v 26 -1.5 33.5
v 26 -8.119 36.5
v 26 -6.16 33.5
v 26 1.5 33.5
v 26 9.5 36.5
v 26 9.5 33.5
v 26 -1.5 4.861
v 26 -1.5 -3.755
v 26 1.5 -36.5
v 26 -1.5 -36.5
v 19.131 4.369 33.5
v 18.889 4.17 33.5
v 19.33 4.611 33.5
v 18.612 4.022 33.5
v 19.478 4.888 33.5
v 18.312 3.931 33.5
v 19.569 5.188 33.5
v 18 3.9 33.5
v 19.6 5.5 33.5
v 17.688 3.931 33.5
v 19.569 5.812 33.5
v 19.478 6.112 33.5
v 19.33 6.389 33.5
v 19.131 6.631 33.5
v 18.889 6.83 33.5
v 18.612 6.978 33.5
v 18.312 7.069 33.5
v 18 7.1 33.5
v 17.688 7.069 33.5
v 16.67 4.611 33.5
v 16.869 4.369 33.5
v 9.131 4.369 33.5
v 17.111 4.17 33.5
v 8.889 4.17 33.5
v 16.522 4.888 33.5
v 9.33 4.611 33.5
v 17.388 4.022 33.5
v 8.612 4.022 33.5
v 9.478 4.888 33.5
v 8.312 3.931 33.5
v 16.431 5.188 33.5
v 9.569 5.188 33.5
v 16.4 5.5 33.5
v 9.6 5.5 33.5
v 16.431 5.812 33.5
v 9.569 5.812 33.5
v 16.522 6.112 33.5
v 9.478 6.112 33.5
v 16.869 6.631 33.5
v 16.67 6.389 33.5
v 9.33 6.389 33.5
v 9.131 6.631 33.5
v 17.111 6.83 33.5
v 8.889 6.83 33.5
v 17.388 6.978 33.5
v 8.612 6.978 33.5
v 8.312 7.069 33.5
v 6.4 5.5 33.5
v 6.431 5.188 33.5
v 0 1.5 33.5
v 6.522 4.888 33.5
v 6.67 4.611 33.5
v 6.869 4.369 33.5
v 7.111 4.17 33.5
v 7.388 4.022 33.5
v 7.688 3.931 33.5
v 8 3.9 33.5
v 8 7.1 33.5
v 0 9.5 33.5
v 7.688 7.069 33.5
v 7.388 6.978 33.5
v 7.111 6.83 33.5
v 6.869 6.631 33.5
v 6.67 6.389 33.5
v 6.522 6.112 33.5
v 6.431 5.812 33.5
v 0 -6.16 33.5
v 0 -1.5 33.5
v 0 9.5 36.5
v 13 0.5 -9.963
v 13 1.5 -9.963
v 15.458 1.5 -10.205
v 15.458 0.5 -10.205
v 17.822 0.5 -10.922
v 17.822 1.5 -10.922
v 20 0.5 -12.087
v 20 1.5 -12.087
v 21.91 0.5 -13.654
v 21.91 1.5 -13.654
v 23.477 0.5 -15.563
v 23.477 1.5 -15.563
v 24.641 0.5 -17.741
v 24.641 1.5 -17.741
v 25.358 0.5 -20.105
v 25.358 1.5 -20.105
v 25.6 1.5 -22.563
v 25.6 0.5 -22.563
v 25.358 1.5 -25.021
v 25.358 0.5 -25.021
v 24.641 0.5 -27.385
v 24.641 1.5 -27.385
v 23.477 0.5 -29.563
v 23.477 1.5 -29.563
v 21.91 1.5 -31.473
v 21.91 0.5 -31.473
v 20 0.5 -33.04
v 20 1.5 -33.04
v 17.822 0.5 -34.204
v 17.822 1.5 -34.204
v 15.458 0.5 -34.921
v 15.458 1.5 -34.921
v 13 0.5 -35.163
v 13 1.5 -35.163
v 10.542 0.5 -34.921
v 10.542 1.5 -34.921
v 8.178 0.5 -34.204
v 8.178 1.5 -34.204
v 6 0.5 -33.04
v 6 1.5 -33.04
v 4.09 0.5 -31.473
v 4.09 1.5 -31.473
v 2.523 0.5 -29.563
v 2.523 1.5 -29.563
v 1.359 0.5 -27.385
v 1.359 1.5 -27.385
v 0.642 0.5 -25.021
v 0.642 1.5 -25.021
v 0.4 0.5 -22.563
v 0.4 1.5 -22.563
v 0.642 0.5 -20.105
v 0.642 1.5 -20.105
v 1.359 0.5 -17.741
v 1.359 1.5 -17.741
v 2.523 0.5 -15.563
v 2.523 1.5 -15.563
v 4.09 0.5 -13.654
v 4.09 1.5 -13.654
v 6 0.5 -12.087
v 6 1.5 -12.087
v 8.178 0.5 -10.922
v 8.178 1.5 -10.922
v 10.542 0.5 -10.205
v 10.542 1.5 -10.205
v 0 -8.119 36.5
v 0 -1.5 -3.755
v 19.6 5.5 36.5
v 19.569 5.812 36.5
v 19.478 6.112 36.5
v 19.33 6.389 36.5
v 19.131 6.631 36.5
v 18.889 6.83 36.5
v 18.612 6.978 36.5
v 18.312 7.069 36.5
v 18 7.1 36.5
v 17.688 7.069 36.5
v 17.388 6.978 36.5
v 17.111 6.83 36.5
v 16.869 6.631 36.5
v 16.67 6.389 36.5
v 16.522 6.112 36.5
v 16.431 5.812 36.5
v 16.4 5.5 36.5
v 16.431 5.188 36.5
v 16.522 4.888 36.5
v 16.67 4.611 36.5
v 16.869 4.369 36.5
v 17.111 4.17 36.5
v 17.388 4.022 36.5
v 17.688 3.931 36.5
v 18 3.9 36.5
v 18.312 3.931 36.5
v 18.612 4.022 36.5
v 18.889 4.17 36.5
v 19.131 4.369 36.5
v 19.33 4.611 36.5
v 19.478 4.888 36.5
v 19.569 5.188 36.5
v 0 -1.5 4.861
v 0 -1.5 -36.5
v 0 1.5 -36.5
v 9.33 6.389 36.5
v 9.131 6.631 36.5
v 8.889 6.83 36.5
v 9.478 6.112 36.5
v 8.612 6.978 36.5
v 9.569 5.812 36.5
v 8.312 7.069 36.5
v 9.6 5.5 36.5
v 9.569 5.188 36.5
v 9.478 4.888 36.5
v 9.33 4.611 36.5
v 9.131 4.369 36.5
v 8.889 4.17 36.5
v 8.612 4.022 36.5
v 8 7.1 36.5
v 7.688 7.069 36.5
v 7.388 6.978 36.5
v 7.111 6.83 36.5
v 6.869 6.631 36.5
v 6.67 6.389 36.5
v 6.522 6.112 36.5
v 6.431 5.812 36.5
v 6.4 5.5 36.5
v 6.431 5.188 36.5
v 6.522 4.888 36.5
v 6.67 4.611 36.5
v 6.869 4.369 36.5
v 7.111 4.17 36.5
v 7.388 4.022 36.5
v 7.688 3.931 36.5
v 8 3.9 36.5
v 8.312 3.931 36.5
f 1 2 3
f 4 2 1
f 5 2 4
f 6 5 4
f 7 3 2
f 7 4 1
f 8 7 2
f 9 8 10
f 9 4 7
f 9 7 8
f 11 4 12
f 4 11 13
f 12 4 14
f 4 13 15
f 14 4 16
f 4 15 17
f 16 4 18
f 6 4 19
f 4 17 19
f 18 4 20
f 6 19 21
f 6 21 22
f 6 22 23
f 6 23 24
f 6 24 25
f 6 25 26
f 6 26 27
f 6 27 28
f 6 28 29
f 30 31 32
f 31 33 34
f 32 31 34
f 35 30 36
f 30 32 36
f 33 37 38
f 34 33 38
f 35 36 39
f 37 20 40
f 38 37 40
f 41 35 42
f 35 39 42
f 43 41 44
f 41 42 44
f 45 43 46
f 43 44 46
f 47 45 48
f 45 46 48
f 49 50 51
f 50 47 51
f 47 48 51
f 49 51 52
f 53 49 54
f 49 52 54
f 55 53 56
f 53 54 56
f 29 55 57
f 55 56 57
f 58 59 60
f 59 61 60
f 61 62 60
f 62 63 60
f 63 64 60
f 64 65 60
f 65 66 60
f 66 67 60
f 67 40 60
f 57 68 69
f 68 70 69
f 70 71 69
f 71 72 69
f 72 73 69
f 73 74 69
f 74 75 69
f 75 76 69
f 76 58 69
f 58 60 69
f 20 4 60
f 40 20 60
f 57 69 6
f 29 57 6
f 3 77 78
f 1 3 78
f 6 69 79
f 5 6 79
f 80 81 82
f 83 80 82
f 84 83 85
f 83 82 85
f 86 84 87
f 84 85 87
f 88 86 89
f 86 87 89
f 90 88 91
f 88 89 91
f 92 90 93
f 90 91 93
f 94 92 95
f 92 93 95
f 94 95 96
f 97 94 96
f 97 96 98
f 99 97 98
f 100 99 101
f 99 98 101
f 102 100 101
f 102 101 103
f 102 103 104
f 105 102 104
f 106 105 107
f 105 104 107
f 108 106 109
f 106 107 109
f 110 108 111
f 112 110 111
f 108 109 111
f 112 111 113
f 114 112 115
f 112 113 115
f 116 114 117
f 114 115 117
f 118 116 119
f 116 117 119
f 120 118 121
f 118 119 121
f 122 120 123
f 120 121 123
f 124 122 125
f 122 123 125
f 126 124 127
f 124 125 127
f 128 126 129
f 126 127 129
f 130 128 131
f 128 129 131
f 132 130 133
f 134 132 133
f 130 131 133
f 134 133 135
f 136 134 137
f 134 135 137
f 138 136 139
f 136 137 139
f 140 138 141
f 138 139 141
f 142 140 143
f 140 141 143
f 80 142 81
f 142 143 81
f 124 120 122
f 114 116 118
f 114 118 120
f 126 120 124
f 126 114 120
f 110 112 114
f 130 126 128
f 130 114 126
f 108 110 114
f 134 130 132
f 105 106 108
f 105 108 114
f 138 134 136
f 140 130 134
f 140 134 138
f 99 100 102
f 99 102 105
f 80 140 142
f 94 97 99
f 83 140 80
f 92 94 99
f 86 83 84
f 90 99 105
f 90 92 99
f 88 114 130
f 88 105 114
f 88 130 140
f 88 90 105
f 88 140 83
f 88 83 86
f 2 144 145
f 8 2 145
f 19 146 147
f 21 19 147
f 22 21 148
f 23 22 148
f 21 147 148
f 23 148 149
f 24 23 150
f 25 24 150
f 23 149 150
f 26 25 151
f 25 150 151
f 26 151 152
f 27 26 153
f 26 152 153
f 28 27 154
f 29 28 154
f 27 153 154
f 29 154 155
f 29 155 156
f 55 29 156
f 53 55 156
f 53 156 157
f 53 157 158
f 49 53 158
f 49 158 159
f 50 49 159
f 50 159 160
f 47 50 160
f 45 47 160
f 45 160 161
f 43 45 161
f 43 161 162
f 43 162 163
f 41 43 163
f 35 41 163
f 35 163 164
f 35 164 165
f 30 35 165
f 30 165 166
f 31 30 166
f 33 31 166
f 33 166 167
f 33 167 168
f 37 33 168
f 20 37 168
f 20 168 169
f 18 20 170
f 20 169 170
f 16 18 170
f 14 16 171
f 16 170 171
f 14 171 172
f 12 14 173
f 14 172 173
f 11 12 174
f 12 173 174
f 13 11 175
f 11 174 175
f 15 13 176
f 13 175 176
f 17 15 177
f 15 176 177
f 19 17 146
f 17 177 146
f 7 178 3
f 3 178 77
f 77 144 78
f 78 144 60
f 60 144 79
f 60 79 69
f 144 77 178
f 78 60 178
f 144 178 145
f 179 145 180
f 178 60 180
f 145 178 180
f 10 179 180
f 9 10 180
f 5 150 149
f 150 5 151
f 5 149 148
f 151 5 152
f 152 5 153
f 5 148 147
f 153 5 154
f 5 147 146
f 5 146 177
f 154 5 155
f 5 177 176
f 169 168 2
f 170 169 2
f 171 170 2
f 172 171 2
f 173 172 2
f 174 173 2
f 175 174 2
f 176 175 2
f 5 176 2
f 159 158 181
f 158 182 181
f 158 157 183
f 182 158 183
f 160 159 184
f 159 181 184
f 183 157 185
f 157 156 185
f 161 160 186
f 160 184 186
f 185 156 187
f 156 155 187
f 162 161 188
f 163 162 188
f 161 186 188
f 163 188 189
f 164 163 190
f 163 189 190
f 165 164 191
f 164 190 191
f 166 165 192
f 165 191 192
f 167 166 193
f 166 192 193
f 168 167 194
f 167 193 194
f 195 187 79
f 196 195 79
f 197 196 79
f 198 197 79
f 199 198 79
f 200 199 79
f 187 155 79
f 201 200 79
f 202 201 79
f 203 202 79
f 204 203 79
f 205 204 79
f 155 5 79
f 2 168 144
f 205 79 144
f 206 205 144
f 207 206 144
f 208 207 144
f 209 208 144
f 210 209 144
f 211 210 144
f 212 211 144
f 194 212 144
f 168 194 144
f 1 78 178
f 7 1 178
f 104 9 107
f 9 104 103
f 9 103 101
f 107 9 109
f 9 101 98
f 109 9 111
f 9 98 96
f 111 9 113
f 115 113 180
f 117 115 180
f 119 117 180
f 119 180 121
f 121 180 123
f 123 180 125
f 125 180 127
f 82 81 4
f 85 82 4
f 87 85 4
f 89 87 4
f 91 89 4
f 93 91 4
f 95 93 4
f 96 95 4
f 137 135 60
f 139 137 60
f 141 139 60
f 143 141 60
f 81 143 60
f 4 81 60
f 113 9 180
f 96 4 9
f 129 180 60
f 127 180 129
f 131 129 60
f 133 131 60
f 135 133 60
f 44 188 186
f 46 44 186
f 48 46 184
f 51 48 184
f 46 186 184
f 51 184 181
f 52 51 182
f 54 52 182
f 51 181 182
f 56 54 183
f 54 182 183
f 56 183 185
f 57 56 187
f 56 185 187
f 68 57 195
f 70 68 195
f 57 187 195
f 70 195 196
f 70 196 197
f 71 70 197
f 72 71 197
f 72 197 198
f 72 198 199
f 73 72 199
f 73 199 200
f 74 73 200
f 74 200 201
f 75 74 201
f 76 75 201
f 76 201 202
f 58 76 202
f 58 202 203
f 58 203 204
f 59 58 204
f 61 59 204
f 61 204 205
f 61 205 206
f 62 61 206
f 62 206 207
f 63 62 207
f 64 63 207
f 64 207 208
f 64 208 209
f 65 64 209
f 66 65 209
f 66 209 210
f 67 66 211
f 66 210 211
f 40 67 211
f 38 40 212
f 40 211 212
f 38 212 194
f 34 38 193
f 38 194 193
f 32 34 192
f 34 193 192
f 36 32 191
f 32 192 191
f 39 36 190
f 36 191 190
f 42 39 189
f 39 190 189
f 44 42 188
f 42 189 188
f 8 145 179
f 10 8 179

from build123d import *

# Parameters (mm, degrees)
EXTRUDE_1_DEPTH     = 26
SKETCH_2_R          = 1.6
CUT_EXTRUDE_1_DEPTH = 10
SKETCH_3_R          = 12.6
CUT_EXTRUDE_2_DEPTH = 1


with BuildPart() as part:
    # 草图1 → 凸台-拉伸1 (new body)
    with BuildSketch(Plane(origin=(0, 0, 0), x_dir=(0, 0, -1), z_dir=(1, 0, 0))):
        Polygon((-36.5, -8.11923054), (3.755241517, -1.5), (36.5, -1.5), (36.5, 1.5), (-33.5, 1.5), (-33.5, 9.5), (-36.5, 9.5), align=None)
        Polygon((-4.861119654, -1.5), (-33.5, -6.160415563), (-33.5, -1.5), align=None, mode=Mode.SUBTRACT)
    extrude(amount=EXTRUDE_1_DEPTH)

    # 草图2 → 切除-拉伸1 (cut)
    with BuildSketch(Plane.XY.offset(36.5)):
        with Locations((8, 5.5)):
            Circle(SKETCH_2_R)
        with Locations((18, 5.5)):
            Circle(SKETCH_2_R)
    extrude(amount=-CUT_EXTRUDE_1_DEPTH, mode=Mode.SUBTRACT)

    # 草图3 → 切除-拉伸2 (cut)
    with BuildSketch(Plane(origin=(0, 1.5, 0), x_dir=(1, 0, 0), z_dir=(0, 1, 0))):
        with Locations(Location((13, 22.563165018, 0), (0, 0, 270))):
            Circle(SKETCH_3_R)
    extrude(amount=-CUT_EXTRUDE_2_DEPTH, mode=Mode.SUBTRACT)


solid = part.part
